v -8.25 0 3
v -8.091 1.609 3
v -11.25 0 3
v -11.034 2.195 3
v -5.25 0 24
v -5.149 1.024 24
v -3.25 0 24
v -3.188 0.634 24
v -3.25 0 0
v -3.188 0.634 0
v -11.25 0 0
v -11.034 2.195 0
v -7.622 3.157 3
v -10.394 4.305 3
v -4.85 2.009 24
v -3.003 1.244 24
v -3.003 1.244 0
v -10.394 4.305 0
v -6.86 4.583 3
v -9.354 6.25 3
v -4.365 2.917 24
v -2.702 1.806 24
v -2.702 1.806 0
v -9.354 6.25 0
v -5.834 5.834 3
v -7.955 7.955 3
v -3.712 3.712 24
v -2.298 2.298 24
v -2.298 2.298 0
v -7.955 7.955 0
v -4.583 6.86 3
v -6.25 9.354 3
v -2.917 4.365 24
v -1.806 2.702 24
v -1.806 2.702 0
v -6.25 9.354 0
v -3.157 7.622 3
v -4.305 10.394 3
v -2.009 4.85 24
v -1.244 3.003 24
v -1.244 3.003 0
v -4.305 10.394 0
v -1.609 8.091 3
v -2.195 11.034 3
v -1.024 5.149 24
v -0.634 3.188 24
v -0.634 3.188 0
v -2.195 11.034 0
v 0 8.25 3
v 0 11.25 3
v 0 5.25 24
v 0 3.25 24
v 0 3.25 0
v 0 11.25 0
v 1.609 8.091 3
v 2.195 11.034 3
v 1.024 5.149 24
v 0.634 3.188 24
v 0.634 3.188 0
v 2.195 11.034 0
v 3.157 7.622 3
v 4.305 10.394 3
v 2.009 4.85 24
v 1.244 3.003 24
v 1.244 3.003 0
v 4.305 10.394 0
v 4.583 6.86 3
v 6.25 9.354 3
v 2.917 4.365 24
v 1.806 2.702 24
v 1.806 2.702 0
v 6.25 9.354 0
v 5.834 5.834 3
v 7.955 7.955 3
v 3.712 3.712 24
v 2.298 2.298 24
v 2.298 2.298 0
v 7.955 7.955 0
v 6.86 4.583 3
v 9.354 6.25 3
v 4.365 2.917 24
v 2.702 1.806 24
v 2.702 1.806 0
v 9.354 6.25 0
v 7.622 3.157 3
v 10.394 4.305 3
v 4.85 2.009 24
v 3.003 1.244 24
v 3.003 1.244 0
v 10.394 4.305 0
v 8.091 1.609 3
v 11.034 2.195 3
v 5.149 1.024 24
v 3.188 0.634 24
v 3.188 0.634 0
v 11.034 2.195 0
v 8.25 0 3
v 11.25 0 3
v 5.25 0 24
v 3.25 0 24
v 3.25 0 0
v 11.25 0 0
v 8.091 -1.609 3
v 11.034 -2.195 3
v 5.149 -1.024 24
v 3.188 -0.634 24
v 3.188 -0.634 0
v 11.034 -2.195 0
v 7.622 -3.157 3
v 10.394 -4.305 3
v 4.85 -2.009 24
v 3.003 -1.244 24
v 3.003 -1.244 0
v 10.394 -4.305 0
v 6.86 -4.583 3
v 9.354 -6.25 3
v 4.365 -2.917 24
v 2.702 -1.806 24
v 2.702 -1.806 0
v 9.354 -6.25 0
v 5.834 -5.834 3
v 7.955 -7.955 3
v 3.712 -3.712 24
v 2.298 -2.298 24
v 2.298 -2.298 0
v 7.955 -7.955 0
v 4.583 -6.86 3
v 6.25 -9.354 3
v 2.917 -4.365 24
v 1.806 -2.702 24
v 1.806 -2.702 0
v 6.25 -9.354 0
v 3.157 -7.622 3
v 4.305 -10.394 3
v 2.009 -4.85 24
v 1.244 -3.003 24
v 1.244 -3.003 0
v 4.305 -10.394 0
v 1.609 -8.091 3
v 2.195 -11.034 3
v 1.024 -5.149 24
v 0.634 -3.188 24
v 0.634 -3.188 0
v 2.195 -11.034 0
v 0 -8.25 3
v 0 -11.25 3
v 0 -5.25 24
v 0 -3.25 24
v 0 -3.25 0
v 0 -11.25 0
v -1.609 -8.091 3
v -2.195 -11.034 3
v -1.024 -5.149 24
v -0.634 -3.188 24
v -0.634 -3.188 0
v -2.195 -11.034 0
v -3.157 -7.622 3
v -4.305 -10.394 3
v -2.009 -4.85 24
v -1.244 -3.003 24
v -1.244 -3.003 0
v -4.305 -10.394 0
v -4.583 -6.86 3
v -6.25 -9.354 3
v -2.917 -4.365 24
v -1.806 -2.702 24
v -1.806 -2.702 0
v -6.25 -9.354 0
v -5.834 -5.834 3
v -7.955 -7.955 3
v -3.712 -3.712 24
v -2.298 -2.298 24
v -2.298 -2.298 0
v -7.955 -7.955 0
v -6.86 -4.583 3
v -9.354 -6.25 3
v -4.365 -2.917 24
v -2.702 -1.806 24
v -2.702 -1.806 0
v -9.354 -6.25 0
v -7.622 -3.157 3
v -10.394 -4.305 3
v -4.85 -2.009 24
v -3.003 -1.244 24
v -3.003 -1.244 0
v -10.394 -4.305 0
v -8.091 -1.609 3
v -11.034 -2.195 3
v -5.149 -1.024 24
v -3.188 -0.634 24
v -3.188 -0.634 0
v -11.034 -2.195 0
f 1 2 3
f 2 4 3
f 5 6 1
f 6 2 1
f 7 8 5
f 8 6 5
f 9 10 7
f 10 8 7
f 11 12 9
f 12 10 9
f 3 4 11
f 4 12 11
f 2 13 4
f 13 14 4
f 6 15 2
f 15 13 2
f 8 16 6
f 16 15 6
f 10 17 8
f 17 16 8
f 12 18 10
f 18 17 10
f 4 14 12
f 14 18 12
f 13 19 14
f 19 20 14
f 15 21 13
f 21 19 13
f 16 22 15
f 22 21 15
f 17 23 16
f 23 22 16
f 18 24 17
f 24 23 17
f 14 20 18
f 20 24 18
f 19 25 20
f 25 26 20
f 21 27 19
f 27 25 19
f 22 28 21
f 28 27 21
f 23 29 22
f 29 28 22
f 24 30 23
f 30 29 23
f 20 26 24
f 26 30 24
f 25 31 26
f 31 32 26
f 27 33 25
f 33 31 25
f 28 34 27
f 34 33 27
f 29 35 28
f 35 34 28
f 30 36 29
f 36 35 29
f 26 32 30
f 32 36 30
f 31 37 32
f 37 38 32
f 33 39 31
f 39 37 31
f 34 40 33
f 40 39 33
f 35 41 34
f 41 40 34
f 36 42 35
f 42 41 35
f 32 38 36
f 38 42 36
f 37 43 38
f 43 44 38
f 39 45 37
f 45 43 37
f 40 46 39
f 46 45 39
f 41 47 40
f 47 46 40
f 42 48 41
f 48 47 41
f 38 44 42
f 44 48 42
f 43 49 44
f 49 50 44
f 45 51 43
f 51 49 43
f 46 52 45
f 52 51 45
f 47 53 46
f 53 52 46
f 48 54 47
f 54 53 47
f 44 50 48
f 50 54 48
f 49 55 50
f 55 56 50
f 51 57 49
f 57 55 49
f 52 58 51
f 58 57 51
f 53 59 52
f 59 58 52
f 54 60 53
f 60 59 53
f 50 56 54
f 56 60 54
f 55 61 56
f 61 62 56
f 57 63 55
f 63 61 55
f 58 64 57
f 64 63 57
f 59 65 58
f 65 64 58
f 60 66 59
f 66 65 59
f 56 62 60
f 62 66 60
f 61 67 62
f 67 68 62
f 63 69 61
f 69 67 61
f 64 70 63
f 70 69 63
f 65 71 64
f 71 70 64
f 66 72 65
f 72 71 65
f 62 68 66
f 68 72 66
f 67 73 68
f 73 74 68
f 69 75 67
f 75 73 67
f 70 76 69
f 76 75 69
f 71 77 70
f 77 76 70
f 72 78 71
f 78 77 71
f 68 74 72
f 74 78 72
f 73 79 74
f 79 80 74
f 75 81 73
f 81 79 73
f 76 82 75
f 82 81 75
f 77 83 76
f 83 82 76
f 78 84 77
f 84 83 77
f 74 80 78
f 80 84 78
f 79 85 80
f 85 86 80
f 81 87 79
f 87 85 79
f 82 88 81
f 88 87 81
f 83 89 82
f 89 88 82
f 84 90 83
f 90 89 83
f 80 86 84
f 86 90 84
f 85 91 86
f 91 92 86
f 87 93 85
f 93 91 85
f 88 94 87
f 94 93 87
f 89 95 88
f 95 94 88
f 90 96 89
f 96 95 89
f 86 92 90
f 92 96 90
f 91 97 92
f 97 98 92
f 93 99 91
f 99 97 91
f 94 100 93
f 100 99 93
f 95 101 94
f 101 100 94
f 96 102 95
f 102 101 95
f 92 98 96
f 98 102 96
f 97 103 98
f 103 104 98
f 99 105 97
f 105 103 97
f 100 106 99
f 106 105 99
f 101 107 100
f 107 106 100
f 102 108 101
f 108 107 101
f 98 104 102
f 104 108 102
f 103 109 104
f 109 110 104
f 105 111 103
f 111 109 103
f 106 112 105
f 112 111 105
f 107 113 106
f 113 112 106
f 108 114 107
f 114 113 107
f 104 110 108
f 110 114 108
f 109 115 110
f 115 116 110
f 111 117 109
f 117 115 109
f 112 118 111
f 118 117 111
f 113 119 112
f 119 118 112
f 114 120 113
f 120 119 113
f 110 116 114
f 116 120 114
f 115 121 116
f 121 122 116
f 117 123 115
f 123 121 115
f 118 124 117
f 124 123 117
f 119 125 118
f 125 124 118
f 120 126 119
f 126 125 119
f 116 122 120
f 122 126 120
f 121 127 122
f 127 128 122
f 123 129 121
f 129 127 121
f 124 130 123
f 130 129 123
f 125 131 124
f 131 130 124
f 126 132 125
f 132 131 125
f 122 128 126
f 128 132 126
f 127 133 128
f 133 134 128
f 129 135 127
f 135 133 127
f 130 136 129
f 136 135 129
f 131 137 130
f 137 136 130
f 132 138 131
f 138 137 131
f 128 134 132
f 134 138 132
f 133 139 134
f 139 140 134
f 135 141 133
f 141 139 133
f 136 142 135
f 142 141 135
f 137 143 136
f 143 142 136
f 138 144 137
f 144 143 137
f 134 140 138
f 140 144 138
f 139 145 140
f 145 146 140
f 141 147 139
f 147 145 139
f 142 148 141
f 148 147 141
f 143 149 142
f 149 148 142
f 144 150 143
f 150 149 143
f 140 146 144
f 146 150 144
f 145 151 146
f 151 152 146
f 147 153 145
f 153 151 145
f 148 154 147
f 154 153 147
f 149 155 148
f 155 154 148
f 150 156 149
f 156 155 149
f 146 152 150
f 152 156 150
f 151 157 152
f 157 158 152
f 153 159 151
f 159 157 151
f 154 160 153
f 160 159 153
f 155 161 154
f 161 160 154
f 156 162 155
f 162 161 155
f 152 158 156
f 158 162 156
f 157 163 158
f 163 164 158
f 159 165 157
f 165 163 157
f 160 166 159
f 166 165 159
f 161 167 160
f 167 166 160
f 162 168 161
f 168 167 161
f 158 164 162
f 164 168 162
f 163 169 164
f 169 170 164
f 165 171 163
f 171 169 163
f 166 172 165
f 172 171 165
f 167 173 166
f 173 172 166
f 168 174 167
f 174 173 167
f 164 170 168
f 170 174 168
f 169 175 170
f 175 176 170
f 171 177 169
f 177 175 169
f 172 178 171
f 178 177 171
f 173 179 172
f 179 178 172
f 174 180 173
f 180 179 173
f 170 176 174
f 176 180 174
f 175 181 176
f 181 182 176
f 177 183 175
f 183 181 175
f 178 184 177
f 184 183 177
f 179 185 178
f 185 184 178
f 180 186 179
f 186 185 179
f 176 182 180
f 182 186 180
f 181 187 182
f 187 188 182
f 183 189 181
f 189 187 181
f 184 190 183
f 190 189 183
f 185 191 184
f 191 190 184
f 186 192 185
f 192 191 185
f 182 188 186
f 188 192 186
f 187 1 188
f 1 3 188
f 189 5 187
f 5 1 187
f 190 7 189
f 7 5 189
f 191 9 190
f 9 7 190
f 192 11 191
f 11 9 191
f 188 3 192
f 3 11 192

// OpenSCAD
$fn = 32;

// ----------------------------------------------------------------------
// Profiled standoff: conical spacer, 24 mm long, bore 6.5 mm
// ----------------------------------------------------------------------

// --- parameters (mm) ---
revolve_angle = 360;      // full turn around the Z axis
profile_points = 6;       // points of the closed outline

profile = [[3.25, 0], [11.25, 0], [11.25, 3], [8.25, 3], [5.25, 24], [3.25, 24]];  // single closed polygon, 6 points, counter clockwise

// --- the one profile operation ---
rotate_extrude(angle = revolve_angle) polygon(points = profile);
